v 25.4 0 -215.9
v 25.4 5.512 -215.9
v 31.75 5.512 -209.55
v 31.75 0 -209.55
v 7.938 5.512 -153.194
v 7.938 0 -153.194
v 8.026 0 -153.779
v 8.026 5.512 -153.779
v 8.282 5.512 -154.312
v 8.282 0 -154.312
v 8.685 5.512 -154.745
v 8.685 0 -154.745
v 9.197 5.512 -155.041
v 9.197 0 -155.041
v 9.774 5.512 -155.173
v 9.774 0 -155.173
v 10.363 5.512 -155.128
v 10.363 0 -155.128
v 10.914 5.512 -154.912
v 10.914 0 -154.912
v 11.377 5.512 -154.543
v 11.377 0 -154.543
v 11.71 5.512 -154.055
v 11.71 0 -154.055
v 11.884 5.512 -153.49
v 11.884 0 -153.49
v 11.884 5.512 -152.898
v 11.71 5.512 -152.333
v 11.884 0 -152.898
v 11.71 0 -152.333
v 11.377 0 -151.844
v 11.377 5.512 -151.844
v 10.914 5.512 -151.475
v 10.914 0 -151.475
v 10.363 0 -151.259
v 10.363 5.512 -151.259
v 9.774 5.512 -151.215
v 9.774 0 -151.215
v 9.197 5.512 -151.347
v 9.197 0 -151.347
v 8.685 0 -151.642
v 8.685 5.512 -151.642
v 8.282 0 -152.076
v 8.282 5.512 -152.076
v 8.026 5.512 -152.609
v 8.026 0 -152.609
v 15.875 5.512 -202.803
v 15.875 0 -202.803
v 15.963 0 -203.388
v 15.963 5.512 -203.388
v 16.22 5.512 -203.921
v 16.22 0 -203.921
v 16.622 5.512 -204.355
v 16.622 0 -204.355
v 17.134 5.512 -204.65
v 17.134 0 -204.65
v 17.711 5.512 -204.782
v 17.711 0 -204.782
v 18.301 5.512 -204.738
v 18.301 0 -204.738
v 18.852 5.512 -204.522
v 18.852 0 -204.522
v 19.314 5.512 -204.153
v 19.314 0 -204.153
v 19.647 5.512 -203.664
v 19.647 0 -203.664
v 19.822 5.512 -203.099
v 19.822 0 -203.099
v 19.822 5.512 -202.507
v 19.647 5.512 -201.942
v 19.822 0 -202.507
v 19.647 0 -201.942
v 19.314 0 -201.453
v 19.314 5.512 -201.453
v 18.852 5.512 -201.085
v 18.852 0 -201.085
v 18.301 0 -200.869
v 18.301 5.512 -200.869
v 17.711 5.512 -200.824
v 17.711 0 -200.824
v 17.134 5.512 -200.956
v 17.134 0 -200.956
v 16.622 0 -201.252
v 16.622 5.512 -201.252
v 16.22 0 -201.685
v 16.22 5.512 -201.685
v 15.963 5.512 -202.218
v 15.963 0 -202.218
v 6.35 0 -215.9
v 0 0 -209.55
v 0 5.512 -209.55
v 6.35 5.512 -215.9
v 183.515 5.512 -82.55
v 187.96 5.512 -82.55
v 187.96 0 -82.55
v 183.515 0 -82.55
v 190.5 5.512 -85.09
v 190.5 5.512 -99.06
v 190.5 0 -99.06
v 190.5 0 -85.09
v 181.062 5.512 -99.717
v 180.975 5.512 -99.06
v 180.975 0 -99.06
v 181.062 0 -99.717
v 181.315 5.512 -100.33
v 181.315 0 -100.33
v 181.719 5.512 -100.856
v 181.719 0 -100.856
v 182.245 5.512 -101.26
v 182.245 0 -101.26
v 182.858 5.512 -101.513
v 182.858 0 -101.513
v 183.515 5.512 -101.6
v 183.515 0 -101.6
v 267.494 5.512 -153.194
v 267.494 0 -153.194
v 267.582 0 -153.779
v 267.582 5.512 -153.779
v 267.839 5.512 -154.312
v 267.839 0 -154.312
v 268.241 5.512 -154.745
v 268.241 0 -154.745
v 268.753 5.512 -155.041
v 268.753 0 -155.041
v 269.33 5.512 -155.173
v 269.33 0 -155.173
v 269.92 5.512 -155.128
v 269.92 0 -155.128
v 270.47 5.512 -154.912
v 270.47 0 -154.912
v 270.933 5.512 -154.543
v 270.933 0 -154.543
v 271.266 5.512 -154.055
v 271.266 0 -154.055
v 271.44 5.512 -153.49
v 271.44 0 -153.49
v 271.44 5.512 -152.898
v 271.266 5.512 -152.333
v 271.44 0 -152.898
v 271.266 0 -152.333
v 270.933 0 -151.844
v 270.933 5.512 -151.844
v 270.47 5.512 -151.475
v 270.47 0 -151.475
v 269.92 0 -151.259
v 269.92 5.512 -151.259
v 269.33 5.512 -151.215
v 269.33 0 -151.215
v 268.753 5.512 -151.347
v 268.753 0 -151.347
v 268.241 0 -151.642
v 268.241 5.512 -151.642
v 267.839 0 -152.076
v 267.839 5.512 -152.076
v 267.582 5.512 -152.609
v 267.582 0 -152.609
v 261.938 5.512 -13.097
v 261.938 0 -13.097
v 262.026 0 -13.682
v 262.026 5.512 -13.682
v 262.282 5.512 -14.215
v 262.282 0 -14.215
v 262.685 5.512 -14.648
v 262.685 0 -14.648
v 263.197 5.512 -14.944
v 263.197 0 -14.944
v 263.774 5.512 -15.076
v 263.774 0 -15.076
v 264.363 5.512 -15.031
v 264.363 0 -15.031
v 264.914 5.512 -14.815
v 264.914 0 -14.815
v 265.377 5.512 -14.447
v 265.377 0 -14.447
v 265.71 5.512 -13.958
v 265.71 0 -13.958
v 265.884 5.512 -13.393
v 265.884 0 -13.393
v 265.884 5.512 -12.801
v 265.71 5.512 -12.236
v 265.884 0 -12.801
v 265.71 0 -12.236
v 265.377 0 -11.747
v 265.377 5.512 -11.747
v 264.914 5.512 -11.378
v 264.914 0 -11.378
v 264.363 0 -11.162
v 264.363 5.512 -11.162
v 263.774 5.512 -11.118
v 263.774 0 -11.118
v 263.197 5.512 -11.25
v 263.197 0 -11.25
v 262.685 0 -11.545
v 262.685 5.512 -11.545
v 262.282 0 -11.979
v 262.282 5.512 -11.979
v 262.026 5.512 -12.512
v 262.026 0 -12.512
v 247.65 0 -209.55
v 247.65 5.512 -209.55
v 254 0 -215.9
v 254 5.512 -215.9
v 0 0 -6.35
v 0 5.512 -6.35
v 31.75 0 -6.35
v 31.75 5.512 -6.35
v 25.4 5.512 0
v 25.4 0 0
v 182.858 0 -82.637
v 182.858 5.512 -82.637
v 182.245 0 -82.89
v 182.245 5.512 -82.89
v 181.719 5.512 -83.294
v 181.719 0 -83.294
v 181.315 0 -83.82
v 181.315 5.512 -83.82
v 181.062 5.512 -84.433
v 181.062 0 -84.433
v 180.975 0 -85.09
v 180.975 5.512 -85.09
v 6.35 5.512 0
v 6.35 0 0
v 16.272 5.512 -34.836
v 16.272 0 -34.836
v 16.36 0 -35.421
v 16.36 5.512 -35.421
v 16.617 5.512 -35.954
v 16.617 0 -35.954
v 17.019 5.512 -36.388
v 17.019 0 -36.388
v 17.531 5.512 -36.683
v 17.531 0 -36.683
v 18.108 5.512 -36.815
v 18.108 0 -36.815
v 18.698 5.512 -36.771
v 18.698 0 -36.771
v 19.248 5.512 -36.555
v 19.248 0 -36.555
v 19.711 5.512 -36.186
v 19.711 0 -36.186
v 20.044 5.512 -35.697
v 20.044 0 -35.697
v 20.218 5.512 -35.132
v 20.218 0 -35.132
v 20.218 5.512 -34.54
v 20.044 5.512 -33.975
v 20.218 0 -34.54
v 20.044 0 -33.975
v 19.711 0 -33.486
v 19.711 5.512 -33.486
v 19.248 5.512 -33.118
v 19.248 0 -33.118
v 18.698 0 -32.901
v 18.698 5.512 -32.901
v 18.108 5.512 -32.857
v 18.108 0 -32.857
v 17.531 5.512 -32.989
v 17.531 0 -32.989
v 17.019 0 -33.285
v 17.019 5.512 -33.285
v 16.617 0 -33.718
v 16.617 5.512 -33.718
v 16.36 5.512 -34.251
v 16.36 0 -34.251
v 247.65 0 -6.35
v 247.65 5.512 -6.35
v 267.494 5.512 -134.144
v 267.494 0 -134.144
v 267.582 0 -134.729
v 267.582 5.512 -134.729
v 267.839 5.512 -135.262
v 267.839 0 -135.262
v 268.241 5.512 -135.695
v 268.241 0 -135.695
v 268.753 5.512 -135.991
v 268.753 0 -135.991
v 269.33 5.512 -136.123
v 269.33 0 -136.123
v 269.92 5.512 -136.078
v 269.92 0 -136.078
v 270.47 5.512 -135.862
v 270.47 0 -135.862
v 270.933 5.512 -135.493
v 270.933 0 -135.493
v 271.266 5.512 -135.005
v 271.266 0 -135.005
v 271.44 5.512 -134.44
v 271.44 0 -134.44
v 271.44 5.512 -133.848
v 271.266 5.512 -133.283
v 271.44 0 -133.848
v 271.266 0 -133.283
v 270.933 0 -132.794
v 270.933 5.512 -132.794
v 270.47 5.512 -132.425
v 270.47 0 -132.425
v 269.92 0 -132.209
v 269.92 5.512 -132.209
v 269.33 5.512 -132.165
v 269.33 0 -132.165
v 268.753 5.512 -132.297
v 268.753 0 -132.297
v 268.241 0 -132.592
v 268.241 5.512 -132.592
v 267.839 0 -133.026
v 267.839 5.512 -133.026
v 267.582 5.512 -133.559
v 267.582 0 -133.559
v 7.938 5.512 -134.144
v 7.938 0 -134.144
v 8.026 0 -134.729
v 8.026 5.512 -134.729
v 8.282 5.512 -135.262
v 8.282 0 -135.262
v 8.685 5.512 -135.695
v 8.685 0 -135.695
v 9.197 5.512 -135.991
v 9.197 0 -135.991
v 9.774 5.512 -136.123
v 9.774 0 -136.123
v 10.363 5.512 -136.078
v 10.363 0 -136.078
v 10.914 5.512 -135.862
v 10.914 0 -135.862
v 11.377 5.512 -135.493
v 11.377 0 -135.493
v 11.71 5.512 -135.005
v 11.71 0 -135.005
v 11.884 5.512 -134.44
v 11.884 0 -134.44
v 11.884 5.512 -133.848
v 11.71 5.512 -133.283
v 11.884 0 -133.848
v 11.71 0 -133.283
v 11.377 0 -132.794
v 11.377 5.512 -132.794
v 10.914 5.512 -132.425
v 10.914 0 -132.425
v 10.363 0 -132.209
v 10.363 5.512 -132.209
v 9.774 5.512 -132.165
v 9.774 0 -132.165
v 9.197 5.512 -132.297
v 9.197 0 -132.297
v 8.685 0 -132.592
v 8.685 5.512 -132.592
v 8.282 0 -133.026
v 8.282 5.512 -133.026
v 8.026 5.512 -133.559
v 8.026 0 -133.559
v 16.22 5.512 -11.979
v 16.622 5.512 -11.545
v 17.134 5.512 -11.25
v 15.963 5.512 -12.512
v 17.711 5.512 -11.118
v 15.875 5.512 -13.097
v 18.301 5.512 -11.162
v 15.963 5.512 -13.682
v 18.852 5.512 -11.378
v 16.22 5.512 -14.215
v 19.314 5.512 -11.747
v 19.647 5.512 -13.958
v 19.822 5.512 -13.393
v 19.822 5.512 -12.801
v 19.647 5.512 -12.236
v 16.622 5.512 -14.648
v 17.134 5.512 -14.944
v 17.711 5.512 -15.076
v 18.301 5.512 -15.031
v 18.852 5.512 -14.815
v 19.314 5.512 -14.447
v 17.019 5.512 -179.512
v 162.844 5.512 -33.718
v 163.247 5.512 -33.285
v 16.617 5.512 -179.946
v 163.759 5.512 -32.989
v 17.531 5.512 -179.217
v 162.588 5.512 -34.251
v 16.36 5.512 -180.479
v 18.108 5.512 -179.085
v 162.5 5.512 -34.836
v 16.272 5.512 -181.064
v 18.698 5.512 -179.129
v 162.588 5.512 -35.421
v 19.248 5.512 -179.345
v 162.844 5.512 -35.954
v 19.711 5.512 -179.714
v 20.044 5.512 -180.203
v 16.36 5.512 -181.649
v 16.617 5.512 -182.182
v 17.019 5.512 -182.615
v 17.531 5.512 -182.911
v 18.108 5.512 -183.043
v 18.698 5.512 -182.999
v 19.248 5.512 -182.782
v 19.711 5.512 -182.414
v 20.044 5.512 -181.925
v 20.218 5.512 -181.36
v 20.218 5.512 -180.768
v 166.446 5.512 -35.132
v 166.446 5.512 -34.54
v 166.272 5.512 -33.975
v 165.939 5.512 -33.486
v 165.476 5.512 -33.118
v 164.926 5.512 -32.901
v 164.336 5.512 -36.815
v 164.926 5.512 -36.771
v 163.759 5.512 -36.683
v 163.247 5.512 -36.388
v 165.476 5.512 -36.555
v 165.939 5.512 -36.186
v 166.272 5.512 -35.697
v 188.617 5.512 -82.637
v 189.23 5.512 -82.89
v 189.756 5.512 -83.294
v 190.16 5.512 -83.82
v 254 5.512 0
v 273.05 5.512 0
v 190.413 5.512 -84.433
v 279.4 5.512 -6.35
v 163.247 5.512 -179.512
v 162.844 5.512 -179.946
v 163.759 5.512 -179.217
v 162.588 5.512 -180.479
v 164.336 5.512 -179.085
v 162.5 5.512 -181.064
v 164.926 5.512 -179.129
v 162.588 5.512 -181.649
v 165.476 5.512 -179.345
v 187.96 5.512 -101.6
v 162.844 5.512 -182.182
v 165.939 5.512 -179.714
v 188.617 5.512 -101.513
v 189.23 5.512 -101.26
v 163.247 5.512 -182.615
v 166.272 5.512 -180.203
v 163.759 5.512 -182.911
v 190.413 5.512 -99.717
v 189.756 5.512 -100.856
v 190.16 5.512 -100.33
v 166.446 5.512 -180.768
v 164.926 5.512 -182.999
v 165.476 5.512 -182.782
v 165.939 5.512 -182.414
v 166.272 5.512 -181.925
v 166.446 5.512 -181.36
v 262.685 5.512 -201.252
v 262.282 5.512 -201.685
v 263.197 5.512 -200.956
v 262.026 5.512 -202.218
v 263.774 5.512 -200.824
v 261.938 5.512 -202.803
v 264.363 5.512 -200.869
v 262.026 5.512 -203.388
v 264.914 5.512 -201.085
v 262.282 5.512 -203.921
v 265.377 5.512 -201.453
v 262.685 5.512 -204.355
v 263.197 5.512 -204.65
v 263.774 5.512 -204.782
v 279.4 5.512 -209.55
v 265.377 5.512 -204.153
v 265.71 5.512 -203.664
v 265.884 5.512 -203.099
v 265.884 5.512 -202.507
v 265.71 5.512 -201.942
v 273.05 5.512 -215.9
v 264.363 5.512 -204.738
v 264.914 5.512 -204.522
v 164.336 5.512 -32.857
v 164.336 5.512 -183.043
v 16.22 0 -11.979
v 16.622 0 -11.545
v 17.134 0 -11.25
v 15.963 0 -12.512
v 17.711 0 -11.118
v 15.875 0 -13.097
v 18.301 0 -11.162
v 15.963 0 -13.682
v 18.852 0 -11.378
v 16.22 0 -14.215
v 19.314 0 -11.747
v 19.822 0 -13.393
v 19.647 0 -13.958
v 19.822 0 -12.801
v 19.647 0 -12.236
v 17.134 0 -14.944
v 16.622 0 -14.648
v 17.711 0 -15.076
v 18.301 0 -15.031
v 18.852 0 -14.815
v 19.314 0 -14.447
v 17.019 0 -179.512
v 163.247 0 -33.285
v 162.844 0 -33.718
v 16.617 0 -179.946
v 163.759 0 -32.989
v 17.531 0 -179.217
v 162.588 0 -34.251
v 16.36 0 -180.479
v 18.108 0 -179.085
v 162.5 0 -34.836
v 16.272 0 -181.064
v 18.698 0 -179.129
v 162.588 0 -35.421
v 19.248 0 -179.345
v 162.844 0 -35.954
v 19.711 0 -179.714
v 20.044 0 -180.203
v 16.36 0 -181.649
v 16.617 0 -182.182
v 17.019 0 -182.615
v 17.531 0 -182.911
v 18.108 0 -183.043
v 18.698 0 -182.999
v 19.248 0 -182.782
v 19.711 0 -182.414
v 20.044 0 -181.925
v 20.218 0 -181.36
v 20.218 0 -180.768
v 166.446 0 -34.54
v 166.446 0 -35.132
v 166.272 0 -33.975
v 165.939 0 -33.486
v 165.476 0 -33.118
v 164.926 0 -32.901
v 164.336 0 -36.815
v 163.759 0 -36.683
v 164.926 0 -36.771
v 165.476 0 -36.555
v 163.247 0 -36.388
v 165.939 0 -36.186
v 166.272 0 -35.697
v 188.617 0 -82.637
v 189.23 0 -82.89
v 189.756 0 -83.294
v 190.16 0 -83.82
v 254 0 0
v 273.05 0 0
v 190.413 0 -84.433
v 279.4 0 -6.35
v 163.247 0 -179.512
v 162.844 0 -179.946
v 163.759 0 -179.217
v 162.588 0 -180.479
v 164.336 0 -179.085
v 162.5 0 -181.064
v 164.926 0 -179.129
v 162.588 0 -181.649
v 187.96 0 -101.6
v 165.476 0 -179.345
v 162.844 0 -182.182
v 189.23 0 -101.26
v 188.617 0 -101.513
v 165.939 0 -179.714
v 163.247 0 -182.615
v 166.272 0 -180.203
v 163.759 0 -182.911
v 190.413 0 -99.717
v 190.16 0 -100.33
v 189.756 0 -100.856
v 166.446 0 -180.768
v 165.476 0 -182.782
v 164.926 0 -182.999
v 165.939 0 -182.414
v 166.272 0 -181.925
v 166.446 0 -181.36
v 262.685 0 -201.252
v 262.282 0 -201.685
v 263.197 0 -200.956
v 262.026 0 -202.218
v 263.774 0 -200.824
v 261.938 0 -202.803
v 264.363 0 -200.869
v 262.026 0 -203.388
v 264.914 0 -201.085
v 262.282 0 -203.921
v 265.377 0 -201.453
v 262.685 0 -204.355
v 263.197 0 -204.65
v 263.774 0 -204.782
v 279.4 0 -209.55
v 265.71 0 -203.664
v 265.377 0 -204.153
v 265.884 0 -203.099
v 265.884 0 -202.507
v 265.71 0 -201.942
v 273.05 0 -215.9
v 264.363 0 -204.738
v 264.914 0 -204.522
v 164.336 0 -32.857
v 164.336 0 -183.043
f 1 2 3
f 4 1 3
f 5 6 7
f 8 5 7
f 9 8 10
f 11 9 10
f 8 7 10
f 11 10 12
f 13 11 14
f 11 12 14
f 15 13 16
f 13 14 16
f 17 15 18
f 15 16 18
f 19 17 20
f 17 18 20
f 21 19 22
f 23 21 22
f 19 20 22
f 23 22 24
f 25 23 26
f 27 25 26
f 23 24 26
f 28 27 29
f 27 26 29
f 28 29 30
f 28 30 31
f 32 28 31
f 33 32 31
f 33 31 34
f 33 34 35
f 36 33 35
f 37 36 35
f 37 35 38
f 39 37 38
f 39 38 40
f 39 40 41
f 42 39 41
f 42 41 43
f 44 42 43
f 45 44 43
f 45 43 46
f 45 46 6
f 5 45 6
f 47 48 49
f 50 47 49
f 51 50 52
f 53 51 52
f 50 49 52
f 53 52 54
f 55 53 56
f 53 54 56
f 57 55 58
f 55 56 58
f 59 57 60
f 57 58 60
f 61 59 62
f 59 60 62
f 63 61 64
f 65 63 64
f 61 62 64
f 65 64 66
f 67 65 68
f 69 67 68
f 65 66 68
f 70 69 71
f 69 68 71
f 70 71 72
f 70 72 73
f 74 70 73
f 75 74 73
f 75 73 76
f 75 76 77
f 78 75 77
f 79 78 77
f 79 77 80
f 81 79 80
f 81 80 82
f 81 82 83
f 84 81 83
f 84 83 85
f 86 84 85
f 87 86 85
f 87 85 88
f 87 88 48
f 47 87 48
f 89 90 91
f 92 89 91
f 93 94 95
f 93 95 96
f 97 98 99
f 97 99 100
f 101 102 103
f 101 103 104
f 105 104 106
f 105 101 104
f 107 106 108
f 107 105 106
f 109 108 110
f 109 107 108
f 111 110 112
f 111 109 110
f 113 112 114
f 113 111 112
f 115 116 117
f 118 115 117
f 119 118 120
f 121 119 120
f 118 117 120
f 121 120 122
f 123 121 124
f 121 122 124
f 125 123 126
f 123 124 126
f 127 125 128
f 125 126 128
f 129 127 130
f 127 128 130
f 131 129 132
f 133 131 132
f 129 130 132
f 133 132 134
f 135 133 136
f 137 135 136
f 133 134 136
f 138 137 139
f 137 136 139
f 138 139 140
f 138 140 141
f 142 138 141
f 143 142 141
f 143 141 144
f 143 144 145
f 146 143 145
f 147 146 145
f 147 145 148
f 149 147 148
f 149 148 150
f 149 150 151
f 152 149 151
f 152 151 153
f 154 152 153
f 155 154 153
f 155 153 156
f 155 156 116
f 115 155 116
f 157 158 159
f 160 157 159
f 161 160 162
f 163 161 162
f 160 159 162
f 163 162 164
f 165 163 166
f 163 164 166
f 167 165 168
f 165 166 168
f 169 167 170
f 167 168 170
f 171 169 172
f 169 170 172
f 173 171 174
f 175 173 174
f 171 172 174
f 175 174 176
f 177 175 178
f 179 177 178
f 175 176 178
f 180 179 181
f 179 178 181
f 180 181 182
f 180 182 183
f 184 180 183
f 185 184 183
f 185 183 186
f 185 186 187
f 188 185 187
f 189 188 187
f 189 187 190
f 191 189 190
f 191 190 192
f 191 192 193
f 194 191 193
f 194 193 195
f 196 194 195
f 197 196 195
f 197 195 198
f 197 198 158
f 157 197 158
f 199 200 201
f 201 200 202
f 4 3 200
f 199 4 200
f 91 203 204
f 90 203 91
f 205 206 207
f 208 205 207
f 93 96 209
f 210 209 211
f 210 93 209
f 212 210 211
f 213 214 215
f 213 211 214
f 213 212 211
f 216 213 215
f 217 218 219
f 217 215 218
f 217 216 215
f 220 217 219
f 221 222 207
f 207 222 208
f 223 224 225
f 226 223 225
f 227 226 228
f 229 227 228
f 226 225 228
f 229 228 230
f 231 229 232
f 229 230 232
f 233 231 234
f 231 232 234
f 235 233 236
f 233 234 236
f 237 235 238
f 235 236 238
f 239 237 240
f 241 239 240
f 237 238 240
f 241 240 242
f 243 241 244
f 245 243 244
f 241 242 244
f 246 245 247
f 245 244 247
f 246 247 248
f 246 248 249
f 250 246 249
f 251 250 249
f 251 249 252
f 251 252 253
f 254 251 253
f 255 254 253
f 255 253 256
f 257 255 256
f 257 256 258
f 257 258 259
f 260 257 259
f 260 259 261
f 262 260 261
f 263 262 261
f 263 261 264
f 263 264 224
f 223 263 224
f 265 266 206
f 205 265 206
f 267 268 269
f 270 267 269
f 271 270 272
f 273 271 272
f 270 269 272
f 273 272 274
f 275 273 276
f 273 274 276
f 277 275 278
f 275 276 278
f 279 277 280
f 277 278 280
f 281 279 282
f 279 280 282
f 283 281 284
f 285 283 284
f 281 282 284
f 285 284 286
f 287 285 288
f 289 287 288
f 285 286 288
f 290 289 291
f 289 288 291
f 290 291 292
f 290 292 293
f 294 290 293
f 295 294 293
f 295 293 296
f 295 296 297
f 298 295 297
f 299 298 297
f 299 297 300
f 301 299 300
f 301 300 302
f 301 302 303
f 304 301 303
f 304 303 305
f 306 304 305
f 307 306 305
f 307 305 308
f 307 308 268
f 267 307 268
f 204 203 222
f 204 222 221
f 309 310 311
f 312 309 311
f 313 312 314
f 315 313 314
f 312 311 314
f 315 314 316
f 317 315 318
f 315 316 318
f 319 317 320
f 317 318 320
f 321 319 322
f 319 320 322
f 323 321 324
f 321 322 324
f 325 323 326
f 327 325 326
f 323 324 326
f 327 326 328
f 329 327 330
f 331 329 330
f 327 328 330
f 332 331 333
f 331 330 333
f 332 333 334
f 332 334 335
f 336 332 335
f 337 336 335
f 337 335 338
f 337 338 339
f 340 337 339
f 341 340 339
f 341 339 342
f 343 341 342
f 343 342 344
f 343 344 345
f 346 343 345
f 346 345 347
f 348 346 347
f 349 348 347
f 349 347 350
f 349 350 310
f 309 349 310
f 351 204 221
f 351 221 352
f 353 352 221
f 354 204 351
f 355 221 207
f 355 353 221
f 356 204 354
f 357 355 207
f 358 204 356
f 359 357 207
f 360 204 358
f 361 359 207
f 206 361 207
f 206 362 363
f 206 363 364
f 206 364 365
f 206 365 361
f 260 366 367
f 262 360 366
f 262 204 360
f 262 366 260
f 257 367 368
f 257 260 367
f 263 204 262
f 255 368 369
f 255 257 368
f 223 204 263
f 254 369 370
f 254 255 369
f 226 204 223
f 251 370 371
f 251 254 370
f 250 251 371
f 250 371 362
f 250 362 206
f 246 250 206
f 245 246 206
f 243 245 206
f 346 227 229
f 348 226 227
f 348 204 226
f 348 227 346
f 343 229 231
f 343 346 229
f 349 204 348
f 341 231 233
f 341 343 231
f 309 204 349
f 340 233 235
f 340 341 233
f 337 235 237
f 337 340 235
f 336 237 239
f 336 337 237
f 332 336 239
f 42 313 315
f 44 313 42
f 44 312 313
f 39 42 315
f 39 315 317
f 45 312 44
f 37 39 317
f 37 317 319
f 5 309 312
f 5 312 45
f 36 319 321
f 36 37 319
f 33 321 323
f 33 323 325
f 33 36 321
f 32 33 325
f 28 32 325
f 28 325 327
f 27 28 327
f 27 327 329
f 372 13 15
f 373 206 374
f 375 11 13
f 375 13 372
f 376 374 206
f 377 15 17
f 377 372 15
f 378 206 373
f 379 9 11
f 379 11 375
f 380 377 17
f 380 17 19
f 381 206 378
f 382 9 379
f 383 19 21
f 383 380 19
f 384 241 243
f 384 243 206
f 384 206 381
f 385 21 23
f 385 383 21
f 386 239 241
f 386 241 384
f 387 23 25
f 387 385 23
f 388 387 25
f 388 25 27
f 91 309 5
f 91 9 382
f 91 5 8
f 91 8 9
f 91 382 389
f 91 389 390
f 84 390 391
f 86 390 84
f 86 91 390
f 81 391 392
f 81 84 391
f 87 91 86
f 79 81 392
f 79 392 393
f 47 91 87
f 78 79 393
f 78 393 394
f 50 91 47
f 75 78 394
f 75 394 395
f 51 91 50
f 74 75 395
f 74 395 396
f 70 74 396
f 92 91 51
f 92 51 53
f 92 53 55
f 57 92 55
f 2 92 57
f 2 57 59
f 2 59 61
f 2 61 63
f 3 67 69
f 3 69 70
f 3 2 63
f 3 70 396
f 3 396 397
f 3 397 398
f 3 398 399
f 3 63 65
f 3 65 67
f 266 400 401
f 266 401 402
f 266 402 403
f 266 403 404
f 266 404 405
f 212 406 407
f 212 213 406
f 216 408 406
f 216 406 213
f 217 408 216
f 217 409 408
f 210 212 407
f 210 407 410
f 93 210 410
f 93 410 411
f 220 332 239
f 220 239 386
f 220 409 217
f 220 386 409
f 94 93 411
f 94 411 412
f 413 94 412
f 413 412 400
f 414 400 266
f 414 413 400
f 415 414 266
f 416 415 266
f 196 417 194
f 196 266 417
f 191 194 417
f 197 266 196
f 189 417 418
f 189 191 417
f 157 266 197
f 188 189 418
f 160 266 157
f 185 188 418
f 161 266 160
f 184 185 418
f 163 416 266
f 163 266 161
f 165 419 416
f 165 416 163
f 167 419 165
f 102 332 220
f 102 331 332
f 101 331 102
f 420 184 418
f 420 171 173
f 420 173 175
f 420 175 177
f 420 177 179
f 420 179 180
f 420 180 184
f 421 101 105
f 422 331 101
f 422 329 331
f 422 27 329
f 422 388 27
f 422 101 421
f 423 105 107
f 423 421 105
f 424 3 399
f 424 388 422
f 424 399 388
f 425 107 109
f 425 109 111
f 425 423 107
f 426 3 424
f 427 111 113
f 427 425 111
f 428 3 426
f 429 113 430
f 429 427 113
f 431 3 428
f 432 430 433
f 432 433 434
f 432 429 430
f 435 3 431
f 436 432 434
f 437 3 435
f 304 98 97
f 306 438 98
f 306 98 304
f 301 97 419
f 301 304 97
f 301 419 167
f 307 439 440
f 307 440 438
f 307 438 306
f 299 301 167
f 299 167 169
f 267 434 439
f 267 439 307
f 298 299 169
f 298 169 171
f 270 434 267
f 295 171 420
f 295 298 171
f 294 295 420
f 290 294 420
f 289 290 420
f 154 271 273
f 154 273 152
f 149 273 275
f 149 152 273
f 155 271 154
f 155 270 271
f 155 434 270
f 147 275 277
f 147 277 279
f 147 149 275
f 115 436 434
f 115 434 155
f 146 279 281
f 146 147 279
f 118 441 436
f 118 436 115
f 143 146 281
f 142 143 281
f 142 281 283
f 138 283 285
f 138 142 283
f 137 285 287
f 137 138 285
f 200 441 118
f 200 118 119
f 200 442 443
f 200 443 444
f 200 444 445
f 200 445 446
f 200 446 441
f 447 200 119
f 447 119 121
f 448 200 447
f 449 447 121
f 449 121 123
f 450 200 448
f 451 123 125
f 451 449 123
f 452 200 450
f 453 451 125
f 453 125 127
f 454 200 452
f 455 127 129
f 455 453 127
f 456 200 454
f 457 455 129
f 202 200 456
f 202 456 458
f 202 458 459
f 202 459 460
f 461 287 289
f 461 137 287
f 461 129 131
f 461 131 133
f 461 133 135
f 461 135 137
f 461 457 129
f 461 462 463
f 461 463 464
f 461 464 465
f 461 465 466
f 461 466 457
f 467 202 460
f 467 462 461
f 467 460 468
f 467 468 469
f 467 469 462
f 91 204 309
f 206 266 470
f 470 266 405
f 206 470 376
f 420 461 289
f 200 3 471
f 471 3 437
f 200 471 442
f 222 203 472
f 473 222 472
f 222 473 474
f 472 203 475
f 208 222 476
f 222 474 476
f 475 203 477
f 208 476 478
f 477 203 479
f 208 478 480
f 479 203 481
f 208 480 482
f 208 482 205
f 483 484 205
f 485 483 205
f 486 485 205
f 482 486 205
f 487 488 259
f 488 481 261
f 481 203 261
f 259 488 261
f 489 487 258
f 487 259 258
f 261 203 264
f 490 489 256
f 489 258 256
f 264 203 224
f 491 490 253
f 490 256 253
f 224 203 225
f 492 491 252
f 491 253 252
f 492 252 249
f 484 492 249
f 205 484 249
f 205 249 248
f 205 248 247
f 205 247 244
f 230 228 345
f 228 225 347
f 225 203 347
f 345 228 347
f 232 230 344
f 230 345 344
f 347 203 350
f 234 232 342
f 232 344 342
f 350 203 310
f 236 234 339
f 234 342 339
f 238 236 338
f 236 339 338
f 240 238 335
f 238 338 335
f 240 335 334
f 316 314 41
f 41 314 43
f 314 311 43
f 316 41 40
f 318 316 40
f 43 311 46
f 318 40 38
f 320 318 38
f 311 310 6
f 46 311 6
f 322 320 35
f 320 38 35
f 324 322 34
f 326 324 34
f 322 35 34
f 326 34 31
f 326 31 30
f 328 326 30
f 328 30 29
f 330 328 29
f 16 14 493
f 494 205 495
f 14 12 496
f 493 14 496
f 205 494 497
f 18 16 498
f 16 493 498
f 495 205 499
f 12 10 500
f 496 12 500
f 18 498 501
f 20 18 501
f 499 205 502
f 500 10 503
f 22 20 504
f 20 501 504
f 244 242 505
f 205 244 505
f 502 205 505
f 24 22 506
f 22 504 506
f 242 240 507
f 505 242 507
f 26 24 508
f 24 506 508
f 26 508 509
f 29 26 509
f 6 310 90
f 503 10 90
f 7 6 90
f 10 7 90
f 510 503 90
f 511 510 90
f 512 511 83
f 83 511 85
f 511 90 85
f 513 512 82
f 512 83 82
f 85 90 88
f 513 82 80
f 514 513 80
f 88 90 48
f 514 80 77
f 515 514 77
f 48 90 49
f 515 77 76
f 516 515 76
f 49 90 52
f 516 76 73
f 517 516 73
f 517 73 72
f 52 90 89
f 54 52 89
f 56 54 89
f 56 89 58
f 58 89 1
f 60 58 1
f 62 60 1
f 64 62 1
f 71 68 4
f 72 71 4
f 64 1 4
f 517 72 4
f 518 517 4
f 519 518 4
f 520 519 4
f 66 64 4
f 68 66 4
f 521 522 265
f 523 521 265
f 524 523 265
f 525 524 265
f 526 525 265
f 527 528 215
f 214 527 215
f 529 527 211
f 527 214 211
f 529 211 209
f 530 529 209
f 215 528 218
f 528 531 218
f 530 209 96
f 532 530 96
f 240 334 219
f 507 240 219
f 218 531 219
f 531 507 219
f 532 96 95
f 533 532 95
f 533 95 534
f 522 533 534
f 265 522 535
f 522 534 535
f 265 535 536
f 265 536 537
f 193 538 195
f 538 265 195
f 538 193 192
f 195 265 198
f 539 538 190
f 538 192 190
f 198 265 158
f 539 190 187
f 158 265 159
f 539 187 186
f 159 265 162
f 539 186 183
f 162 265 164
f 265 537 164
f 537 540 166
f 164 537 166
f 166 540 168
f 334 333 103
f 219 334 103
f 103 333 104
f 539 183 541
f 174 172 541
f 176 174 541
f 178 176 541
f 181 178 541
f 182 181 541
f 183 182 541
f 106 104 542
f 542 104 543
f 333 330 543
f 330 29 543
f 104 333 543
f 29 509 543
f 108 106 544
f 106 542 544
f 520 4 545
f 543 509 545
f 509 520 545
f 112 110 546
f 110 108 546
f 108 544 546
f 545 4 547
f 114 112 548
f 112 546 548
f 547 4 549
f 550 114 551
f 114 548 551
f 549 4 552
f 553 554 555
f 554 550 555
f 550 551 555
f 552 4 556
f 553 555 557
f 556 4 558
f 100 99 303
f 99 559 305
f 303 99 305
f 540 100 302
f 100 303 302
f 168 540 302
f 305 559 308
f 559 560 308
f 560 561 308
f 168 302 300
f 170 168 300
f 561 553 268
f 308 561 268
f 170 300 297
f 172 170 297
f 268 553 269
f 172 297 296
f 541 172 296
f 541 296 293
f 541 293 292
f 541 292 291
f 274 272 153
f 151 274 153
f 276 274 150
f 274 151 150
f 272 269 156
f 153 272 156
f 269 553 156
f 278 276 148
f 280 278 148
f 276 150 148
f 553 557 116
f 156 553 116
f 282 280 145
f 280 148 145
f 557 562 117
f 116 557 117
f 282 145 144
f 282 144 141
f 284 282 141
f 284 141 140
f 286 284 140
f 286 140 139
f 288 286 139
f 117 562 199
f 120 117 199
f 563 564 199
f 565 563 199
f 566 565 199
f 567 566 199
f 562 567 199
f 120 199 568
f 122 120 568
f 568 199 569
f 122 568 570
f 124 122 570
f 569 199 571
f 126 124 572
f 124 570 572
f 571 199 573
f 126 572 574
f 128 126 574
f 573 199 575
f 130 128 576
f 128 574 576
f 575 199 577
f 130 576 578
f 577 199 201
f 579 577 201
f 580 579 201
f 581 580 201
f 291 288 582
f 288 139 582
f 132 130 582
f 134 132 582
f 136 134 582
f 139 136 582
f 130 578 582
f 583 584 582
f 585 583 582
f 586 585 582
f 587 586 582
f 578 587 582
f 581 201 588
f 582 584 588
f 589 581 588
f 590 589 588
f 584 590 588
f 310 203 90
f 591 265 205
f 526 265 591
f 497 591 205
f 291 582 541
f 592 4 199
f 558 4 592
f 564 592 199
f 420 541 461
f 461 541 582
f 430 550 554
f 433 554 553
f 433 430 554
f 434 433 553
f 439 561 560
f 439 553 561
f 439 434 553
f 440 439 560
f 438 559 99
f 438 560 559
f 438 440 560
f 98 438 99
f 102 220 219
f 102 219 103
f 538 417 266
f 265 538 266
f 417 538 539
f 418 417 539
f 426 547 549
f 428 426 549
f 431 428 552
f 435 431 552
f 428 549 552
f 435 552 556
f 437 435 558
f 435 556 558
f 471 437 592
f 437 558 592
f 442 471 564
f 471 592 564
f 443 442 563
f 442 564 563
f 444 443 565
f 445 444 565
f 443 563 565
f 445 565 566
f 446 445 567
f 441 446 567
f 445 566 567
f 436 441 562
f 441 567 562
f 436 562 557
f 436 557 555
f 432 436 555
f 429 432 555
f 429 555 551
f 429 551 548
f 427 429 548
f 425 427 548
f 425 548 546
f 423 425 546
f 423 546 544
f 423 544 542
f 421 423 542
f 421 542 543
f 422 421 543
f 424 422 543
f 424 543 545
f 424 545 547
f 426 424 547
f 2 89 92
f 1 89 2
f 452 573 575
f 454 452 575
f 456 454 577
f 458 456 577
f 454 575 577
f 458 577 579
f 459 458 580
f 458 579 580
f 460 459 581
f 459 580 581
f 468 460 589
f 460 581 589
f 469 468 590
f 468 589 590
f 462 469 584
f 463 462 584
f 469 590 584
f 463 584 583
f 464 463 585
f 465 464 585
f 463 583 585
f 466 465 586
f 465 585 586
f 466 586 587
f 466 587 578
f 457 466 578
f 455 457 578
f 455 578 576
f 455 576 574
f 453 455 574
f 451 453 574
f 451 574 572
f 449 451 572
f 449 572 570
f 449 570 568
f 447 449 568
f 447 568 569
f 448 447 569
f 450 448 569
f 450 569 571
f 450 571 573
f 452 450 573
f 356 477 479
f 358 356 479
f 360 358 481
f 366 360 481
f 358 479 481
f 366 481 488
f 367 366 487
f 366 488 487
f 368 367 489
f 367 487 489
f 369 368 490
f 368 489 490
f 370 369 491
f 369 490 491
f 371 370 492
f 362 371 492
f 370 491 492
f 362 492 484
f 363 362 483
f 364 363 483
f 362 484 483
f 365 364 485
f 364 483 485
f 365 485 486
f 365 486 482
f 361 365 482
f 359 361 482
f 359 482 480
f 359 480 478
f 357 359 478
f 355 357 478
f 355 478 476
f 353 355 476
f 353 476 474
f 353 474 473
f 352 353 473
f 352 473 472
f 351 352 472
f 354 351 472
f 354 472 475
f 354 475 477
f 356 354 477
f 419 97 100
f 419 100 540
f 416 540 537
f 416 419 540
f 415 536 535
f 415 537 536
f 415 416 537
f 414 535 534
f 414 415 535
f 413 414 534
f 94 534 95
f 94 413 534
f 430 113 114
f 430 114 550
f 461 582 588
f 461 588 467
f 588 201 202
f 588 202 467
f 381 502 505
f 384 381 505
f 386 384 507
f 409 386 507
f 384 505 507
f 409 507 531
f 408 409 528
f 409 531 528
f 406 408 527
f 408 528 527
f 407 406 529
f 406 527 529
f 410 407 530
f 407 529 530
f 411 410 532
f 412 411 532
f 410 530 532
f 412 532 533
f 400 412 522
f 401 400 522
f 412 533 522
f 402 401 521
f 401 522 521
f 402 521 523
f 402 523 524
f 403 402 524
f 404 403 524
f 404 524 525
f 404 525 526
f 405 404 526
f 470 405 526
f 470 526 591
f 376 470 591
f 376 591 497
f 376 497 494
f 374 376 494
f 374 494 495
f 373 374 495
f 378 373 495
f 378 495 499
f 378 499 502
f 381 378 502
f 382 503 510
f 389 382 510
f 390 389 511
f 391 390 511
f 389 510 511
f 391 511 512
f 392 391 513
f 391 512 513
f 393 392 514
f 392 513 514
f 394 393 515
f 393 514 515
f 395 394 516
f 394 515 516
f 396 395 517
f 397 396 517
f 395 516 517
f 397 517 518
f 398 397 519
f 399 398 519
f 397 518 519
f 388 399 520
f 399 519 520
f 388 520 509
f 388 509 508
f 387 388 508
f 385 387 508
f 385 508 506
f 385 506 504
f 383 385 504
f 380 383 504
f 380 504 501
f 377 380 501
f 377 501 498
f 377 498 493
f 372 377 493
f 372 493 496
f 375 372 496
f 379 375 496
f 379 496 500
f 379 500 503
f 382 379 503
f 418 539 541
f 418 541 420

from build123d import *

# Parameters (mm, degrees)
SKETCH1_W                       = 279.4
SKETCH1_H                       = 215.9
BOSS_EXTRUDE1_DEPTH             = 5.5118
F_5_32_0_15625_DIAMETER_HOLE1_D = 3.96875
F_5_32_0_15625_DIAMETER_HOLE2_D = 3.96875
CUT_EXTRUDE2_DEPTH              = 6.5118
CHAMFER1_SIZE                   = 6.35
CUT_EXTRUDE3_DEPTH              = 6.5118


with BuildPart() as part:
    # Sketch1 → Boss-Extrude1 (new body)
    with BuildSketch(Plane(origin=(0, 0, 0), x_dir=(1, 0, 0), z_dir=(0, 1, 0))):
        with Locations((139.7, 107.95)):
            Rectangle(SKETCH1_W, SKETCH1_H)
    extrude(amount=BOSS_EXTRUDE1_DEPTH)

    # 5/32 (0.15625) Diameter Hole1 (through all)
    with Locations(Plane(origin=(0, 5.5118, 0), x_dir=(1, 0, 0), z_dir=(0, 1, 0))):
        with Locations((17.859375, 13.096875), (17.859375, 202.803125), (9.921875, 153.19375), (9.921875, 134.14375), (263.921875, 13.096875), (269.478125, 134.14375), (269.478125, 153.19375), (263.921875, 202.803125)):
            Hole(F_5_32_0_15625_DIAMETER_HOLE1_D / 2)

    # 5/32 (0.15625) Diameter Hole2 (through all)
    with Locations(Plane(origin=(0, 5.5118, 0), x_dir=(1, 0, 0), z_dir=(0, 1, 0))):
        with Locations((18.25625, 34.8361), (164.48405, 34.8361), (164.48405, 181.0639), (18.25625, 181.0639)):
            Hole(F_5_32_0_15625_DIAMETER_HOLE2_D / 2)

    # Sketch6 → Cut-Extrude2 (cut, through all)
    with BuildSketch(Plane(origin=(0, 5.5118, 0), x_dir=(1, 0, 0), z_dir=(0, 1, 0))):
        Polygon((247.65, 209.55), (254, 215.9), (25.4, 215.9), (31.75, 209.55), align=None)
        Polygon((25.4, 0), (254, 0), (247.65, 6.35), (31.75, 6.35), align=None)
    extrude(amount=-CUT_EXTRUDE2_DEPTH, mode=Mode.SUBTRACT)

    # Chamfer1
    chamfer1_edges = [part.edges().sort_by_distance(p)[0] for p in [
        (0, 2.7559, -215.9),
        (279.4, 2.7559, -215.9),
        (279.4, 2.7559, 0),
        (0, 2.7559, 0),
    ]]
    chamfer(chamfer1_edges, length=CHAMFER1_SIZE)

    # Sketch7 → Cut-Extrude3 (cut, through all)
    with BuildSketch(Plane(origin=(0, 5.5118, 0), x_dir=(1, 0, 0), z_dir=(0, 1, 0))):
        with BuildLine():
            Line((183.515, 101.6), (187.96, 101.6))
            ThreePointArc((187.96, 101.6), (189.756051224, 100.856051224), (190.5, 99.06))
            Line((190.5, 99.06), (190.5, 85.09))
            ThreePointArc((190.5, 85.09), (189.756051224, 83.293948776), (187.96, 82.55))
            Line((187.96, 82.55), (183.515, 82.55))
            ThreePointArc((183.515, 82.55), (181.718948776, 83.293948776), (180.975, 85.09))
            Line((180.975, 85.09), (180.975, 99.06))
            ThreePointArc((180.975, 99.06), (181.718948776, 100.856051224), (183.515, 101.6))
        make_face()
    extrude(amount=-CUT_EXTRUDE3_DEPTH, mode=Mode.SUBTRACT)


solid = part.part
